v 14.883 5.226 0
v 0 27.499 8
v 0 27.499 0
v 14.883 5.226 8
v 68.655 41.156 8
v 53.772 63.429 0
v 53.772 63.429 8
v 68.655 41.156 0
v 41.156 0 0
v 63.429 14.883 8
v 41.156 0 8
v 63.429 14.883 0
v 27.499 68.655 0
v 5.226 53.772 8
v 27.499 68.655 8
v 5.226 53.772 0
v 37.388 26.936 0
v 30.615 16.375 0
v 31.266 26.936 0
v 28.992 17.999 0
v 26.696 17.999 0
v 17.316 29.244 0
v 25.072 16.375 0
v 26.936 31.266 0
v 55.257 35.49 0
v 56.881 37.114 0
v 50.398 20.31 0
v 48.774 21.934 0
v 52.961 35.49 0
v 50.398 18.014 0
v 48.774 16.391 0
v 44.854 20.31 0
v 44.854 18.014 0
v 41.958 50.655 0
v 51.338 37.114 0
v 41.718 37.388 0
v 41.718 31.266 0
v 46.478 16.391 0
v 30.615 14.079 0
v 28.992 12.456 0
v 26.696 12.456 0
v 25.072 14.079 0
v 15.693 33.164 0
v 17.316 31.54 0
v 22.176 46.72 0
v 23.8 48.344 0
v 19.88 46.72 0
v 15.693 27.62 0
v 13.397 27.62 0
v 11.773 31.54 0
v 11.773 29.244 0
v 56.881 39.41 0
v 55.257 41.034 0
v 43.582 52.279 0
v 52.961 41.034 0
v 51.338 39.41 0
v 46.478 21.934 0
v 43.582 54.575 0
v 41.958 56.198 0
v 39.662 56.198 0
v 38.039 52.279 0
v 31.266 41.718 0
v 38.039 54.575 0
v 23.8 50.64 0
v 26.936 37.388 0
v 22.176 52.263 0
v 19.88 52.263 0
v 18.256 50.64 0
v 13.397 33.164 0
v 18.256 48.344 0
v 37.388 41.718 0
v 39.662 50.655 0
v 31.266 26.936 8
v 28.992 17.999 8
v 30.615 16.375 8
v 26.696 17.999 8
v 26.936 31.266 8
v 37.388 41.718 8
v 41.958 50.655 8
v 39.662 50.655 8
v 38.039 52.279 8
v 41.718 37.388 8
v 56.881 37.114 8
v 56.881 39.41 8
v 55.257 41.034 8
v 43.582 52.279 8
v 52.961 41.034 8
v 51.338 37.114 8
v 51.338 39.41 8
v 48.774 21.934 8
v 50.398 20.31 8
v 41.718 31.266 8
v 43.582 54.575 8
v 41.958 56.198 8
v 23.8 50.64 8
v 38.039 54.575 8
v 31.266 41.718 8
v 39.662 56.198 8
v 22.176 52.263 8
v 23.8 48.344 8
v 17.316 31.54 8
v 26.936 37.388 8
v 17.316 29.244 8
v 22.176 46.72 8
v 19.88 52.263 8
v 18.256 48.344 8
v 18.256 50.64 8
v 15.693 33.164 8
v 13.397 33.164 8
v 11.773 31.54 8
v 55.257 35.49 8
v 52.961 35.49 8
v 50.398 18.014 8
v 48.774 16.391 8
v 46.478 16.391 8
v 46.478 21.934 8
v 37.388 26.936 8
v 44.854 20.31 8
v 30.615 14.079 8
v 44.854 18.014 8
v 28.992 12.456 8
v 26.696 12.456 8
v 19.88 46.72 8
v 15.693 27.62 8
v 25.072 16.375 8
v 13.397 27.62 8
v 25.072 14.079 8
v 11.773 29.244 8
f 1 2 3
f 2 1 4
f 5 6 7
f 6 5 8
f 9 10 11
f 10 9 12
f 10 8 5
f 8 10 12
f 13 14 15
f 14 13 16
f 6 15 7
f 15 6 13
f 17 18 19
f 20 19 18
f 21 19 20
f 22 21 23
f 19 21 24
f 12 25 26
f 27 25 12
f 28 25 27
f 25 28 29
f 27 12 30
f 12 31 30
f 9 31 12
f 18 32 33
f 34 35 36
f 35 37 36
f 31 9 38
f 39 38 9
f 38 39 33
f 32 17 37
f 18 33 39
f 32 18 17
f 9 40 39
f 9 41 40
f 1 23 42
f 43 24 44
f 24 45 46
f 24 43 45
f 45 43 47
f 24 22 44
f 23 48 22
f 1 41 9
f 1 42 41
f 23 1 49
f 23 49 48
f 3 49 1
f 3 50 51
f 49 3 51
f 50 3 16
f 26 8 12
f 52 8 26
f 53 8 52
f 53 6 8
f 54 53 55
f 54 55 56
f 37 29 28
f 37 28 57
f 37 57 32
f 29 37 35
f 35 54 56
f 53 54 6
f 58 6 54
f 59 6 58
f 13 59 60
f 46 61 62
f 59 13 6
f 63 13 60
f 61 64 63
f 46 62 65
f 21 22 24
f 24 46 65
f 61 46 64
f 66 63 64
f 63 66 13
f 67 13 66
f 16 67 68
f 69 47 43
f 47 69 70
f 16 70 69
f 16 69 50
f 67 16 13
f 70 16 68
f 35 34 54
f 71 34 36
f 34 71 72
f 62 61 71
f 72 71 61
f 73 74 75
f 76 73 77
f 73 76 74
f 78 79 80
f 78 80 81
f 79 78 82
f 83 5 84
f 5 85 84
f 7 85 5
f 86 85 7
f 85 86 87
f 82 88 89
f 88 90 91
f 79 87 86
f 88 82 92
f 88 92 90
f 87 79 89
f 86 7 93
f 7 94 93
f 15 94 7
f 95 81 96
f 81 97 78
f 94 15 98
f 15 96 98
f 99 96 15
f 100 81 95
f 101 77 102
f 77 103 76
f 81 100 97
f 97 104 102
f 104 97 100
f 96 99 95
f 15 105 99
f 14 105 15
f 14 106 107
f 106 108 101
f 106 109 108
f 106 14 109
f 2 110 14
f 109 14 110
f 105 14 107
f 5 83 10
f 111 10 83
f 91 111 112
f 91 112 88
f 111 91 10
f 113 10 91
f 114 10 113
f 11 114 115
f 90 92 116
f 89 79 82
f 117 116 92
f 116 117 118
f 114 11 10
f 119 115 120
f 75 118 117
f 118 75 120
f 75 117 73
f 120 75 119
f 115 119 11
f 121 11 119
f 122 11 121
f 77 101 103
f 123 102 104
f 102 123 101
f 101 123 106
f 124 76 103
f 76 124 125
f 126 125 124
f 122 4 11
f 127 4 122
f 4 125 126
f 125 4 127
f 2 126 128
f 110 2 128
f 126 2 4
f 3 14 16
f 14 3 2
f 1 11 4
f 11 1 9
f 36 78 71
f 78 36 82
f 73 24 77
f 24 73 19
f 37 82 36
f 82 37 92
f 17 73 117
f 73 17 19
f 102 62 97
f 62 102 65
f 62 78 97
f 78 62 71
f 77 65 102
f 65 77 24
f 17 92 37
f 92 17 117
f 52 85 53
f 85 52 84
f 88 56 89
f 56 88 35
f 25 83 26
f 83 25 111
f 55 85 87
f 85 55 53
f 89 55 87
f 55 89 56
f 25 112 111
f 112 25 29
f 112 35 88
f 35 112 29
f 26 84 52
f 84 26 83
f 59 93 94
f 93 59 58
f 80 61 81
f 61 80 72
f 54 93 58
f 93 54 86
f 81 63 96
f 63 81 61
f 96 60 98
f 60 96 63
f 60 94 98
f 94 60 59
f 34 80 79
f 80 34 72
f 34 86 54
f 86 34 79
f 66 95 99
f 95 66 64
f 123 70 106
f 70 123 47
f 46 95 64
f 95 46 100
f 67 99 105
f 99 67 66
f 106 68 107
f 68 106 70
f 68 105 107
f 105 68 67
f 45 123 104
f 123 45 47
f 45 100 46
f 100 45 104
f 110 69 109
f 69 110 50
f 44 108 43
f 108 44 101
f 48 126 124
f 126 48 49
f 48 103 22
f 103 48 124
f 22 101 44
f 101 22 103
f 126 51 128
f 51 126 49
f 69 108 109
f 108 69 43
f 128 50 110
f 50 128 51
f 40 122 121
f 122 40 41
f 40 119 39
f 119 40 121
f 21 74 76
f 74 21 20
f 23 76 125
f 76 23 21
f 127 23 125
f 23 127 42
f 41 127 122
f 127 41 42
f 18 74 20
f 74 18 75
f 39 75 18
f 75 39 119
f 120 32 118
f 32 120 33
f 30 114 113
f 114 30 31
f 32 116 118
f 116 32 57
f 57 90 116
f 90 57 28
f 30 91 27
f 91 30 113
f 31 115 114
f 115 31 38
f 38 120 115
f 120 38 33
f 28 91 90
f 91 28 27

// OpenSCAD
$fn = 32;

// ----------------------------------------------------------------------
// Polygon plate: 8-gon R35, 6 bolt windows
// ----------------------------------------------------------------------

// --- parameters (mm) ---
sides = 8;                // number of polygon sides
plate_r = 35;             // circumscribed radius of the polygon
bore_r = 8;               // centre bore radius
bolts = 6;                // number of bolt windows
ring_r = 20.17;           // bolt-circle radius
bolt_r = 3;               // bolt window radius
plate_t = 8;              // plate thickness, Z (extrusion height)

plate_d = 2 * plate_r;  // circumscribed diameter
bore_d = 2 * bore_r;  // centre bore diameter
bolt_d = 2 * bolt_r;  // bolt window diameter
ring_d = 2 * ring_r;  // bolt-circle diameter

profile = [[68.655, 41.156], [53.772, 63.429], [27.499, 68.655], [5.226, 53.772], [0, 27.499], [14.883, 5.226], [41.156, 0], [63.429, 14.883]];  // primary outline, 8 points, counter clockwise
void_1 = [[41.718, 37.388], [37.388, 41.718], [31.266, 41.718], [26.936, 37.388], [26.936, 31.266], [31.266, 26.936], [37.388, 26.936], [41.718, 31.266]];  // centre bore, 8 points
void_2 = [[56.881, 39.41], [55.257, 41.034], [52.961, 41.034], [51.338, 39.41], [51.338, 37.114], [52.961, 35.49], [55.257, 35.49], [56.881, 37.114]];  // bolt window 1, 8 points
void_3 = [[43.582, 54.575], [41.958, 56.198], [39.662, 56.198], [38.039, 54.575], [38.039, 52.279], [39.662, 50.655], [41.958, 50.655], [43.582, 52.279]];  // bolt window 2, 8 points
void_4 = [[23.8, 50.64], [22.176, 52.263], [19.88, 52.263], [18.256, 50.64], [18.256, 48.344], [19.88, 46.72], [22.176, 46.72], [23.8, 48.344]];  // bolt window 3, 8 points
void_5 = [[17.316, 31.54], [15.693, 33.164], [13.397, 33.164], [11.773, 31.54], [11.773, 29.244], [13.397, 27.62], [15.693, 27.62], [17.316, 29.244]];  // bolt window 4, 8 points
void_6 = [[30.615, 16.375], [28.992, 17.999], [26.696, 17.999], [25.072, 16.375], [25.072, 14.079], [26.696, 12.456], [28.992, 12.456], [30.615, 14.079]];  // bolt window 5, 8 points
void_7 = [[50.398, 20.31], [48.774, 21.934], [46.478, 21.934], [44.854, 20.31], [44.854, 18.014], [46.478, 16.391], [48.774, 16.391], [50.398, 18.014]];  // bolt window 6, 8 points

// --- the one profile operation ---
difference() {
  linear_extrude(height = plate_t) polygon(points = profile);
  translate([0, 0, -1])
    linear_extrude(height = plate_t + 2) polygon(points = void_1);
  translate([0, 0, -1])
    linear_extrude(height = plate_t + 2) polygon(points = void_2);
  translate([0, 0, -1])
    linear_extrude(height = plate_t + 2) polygon(points = void_3);
  translate([0, 0, -1])
    linear_extrude(height = plate_t + 2) polygon(points = void_4);
  translate([0, 0, -1])
    linear_extrude(height = plate_t + 2) polygon(points = void_5);
  translate([0, 0, -1])
    linear_extrude(height = plate_t + 2) polygon(points = void_6);
  translate([0, 0, -1])
    linear_extrude(height = plate_t + 2) polygon(points = void_7);
}
